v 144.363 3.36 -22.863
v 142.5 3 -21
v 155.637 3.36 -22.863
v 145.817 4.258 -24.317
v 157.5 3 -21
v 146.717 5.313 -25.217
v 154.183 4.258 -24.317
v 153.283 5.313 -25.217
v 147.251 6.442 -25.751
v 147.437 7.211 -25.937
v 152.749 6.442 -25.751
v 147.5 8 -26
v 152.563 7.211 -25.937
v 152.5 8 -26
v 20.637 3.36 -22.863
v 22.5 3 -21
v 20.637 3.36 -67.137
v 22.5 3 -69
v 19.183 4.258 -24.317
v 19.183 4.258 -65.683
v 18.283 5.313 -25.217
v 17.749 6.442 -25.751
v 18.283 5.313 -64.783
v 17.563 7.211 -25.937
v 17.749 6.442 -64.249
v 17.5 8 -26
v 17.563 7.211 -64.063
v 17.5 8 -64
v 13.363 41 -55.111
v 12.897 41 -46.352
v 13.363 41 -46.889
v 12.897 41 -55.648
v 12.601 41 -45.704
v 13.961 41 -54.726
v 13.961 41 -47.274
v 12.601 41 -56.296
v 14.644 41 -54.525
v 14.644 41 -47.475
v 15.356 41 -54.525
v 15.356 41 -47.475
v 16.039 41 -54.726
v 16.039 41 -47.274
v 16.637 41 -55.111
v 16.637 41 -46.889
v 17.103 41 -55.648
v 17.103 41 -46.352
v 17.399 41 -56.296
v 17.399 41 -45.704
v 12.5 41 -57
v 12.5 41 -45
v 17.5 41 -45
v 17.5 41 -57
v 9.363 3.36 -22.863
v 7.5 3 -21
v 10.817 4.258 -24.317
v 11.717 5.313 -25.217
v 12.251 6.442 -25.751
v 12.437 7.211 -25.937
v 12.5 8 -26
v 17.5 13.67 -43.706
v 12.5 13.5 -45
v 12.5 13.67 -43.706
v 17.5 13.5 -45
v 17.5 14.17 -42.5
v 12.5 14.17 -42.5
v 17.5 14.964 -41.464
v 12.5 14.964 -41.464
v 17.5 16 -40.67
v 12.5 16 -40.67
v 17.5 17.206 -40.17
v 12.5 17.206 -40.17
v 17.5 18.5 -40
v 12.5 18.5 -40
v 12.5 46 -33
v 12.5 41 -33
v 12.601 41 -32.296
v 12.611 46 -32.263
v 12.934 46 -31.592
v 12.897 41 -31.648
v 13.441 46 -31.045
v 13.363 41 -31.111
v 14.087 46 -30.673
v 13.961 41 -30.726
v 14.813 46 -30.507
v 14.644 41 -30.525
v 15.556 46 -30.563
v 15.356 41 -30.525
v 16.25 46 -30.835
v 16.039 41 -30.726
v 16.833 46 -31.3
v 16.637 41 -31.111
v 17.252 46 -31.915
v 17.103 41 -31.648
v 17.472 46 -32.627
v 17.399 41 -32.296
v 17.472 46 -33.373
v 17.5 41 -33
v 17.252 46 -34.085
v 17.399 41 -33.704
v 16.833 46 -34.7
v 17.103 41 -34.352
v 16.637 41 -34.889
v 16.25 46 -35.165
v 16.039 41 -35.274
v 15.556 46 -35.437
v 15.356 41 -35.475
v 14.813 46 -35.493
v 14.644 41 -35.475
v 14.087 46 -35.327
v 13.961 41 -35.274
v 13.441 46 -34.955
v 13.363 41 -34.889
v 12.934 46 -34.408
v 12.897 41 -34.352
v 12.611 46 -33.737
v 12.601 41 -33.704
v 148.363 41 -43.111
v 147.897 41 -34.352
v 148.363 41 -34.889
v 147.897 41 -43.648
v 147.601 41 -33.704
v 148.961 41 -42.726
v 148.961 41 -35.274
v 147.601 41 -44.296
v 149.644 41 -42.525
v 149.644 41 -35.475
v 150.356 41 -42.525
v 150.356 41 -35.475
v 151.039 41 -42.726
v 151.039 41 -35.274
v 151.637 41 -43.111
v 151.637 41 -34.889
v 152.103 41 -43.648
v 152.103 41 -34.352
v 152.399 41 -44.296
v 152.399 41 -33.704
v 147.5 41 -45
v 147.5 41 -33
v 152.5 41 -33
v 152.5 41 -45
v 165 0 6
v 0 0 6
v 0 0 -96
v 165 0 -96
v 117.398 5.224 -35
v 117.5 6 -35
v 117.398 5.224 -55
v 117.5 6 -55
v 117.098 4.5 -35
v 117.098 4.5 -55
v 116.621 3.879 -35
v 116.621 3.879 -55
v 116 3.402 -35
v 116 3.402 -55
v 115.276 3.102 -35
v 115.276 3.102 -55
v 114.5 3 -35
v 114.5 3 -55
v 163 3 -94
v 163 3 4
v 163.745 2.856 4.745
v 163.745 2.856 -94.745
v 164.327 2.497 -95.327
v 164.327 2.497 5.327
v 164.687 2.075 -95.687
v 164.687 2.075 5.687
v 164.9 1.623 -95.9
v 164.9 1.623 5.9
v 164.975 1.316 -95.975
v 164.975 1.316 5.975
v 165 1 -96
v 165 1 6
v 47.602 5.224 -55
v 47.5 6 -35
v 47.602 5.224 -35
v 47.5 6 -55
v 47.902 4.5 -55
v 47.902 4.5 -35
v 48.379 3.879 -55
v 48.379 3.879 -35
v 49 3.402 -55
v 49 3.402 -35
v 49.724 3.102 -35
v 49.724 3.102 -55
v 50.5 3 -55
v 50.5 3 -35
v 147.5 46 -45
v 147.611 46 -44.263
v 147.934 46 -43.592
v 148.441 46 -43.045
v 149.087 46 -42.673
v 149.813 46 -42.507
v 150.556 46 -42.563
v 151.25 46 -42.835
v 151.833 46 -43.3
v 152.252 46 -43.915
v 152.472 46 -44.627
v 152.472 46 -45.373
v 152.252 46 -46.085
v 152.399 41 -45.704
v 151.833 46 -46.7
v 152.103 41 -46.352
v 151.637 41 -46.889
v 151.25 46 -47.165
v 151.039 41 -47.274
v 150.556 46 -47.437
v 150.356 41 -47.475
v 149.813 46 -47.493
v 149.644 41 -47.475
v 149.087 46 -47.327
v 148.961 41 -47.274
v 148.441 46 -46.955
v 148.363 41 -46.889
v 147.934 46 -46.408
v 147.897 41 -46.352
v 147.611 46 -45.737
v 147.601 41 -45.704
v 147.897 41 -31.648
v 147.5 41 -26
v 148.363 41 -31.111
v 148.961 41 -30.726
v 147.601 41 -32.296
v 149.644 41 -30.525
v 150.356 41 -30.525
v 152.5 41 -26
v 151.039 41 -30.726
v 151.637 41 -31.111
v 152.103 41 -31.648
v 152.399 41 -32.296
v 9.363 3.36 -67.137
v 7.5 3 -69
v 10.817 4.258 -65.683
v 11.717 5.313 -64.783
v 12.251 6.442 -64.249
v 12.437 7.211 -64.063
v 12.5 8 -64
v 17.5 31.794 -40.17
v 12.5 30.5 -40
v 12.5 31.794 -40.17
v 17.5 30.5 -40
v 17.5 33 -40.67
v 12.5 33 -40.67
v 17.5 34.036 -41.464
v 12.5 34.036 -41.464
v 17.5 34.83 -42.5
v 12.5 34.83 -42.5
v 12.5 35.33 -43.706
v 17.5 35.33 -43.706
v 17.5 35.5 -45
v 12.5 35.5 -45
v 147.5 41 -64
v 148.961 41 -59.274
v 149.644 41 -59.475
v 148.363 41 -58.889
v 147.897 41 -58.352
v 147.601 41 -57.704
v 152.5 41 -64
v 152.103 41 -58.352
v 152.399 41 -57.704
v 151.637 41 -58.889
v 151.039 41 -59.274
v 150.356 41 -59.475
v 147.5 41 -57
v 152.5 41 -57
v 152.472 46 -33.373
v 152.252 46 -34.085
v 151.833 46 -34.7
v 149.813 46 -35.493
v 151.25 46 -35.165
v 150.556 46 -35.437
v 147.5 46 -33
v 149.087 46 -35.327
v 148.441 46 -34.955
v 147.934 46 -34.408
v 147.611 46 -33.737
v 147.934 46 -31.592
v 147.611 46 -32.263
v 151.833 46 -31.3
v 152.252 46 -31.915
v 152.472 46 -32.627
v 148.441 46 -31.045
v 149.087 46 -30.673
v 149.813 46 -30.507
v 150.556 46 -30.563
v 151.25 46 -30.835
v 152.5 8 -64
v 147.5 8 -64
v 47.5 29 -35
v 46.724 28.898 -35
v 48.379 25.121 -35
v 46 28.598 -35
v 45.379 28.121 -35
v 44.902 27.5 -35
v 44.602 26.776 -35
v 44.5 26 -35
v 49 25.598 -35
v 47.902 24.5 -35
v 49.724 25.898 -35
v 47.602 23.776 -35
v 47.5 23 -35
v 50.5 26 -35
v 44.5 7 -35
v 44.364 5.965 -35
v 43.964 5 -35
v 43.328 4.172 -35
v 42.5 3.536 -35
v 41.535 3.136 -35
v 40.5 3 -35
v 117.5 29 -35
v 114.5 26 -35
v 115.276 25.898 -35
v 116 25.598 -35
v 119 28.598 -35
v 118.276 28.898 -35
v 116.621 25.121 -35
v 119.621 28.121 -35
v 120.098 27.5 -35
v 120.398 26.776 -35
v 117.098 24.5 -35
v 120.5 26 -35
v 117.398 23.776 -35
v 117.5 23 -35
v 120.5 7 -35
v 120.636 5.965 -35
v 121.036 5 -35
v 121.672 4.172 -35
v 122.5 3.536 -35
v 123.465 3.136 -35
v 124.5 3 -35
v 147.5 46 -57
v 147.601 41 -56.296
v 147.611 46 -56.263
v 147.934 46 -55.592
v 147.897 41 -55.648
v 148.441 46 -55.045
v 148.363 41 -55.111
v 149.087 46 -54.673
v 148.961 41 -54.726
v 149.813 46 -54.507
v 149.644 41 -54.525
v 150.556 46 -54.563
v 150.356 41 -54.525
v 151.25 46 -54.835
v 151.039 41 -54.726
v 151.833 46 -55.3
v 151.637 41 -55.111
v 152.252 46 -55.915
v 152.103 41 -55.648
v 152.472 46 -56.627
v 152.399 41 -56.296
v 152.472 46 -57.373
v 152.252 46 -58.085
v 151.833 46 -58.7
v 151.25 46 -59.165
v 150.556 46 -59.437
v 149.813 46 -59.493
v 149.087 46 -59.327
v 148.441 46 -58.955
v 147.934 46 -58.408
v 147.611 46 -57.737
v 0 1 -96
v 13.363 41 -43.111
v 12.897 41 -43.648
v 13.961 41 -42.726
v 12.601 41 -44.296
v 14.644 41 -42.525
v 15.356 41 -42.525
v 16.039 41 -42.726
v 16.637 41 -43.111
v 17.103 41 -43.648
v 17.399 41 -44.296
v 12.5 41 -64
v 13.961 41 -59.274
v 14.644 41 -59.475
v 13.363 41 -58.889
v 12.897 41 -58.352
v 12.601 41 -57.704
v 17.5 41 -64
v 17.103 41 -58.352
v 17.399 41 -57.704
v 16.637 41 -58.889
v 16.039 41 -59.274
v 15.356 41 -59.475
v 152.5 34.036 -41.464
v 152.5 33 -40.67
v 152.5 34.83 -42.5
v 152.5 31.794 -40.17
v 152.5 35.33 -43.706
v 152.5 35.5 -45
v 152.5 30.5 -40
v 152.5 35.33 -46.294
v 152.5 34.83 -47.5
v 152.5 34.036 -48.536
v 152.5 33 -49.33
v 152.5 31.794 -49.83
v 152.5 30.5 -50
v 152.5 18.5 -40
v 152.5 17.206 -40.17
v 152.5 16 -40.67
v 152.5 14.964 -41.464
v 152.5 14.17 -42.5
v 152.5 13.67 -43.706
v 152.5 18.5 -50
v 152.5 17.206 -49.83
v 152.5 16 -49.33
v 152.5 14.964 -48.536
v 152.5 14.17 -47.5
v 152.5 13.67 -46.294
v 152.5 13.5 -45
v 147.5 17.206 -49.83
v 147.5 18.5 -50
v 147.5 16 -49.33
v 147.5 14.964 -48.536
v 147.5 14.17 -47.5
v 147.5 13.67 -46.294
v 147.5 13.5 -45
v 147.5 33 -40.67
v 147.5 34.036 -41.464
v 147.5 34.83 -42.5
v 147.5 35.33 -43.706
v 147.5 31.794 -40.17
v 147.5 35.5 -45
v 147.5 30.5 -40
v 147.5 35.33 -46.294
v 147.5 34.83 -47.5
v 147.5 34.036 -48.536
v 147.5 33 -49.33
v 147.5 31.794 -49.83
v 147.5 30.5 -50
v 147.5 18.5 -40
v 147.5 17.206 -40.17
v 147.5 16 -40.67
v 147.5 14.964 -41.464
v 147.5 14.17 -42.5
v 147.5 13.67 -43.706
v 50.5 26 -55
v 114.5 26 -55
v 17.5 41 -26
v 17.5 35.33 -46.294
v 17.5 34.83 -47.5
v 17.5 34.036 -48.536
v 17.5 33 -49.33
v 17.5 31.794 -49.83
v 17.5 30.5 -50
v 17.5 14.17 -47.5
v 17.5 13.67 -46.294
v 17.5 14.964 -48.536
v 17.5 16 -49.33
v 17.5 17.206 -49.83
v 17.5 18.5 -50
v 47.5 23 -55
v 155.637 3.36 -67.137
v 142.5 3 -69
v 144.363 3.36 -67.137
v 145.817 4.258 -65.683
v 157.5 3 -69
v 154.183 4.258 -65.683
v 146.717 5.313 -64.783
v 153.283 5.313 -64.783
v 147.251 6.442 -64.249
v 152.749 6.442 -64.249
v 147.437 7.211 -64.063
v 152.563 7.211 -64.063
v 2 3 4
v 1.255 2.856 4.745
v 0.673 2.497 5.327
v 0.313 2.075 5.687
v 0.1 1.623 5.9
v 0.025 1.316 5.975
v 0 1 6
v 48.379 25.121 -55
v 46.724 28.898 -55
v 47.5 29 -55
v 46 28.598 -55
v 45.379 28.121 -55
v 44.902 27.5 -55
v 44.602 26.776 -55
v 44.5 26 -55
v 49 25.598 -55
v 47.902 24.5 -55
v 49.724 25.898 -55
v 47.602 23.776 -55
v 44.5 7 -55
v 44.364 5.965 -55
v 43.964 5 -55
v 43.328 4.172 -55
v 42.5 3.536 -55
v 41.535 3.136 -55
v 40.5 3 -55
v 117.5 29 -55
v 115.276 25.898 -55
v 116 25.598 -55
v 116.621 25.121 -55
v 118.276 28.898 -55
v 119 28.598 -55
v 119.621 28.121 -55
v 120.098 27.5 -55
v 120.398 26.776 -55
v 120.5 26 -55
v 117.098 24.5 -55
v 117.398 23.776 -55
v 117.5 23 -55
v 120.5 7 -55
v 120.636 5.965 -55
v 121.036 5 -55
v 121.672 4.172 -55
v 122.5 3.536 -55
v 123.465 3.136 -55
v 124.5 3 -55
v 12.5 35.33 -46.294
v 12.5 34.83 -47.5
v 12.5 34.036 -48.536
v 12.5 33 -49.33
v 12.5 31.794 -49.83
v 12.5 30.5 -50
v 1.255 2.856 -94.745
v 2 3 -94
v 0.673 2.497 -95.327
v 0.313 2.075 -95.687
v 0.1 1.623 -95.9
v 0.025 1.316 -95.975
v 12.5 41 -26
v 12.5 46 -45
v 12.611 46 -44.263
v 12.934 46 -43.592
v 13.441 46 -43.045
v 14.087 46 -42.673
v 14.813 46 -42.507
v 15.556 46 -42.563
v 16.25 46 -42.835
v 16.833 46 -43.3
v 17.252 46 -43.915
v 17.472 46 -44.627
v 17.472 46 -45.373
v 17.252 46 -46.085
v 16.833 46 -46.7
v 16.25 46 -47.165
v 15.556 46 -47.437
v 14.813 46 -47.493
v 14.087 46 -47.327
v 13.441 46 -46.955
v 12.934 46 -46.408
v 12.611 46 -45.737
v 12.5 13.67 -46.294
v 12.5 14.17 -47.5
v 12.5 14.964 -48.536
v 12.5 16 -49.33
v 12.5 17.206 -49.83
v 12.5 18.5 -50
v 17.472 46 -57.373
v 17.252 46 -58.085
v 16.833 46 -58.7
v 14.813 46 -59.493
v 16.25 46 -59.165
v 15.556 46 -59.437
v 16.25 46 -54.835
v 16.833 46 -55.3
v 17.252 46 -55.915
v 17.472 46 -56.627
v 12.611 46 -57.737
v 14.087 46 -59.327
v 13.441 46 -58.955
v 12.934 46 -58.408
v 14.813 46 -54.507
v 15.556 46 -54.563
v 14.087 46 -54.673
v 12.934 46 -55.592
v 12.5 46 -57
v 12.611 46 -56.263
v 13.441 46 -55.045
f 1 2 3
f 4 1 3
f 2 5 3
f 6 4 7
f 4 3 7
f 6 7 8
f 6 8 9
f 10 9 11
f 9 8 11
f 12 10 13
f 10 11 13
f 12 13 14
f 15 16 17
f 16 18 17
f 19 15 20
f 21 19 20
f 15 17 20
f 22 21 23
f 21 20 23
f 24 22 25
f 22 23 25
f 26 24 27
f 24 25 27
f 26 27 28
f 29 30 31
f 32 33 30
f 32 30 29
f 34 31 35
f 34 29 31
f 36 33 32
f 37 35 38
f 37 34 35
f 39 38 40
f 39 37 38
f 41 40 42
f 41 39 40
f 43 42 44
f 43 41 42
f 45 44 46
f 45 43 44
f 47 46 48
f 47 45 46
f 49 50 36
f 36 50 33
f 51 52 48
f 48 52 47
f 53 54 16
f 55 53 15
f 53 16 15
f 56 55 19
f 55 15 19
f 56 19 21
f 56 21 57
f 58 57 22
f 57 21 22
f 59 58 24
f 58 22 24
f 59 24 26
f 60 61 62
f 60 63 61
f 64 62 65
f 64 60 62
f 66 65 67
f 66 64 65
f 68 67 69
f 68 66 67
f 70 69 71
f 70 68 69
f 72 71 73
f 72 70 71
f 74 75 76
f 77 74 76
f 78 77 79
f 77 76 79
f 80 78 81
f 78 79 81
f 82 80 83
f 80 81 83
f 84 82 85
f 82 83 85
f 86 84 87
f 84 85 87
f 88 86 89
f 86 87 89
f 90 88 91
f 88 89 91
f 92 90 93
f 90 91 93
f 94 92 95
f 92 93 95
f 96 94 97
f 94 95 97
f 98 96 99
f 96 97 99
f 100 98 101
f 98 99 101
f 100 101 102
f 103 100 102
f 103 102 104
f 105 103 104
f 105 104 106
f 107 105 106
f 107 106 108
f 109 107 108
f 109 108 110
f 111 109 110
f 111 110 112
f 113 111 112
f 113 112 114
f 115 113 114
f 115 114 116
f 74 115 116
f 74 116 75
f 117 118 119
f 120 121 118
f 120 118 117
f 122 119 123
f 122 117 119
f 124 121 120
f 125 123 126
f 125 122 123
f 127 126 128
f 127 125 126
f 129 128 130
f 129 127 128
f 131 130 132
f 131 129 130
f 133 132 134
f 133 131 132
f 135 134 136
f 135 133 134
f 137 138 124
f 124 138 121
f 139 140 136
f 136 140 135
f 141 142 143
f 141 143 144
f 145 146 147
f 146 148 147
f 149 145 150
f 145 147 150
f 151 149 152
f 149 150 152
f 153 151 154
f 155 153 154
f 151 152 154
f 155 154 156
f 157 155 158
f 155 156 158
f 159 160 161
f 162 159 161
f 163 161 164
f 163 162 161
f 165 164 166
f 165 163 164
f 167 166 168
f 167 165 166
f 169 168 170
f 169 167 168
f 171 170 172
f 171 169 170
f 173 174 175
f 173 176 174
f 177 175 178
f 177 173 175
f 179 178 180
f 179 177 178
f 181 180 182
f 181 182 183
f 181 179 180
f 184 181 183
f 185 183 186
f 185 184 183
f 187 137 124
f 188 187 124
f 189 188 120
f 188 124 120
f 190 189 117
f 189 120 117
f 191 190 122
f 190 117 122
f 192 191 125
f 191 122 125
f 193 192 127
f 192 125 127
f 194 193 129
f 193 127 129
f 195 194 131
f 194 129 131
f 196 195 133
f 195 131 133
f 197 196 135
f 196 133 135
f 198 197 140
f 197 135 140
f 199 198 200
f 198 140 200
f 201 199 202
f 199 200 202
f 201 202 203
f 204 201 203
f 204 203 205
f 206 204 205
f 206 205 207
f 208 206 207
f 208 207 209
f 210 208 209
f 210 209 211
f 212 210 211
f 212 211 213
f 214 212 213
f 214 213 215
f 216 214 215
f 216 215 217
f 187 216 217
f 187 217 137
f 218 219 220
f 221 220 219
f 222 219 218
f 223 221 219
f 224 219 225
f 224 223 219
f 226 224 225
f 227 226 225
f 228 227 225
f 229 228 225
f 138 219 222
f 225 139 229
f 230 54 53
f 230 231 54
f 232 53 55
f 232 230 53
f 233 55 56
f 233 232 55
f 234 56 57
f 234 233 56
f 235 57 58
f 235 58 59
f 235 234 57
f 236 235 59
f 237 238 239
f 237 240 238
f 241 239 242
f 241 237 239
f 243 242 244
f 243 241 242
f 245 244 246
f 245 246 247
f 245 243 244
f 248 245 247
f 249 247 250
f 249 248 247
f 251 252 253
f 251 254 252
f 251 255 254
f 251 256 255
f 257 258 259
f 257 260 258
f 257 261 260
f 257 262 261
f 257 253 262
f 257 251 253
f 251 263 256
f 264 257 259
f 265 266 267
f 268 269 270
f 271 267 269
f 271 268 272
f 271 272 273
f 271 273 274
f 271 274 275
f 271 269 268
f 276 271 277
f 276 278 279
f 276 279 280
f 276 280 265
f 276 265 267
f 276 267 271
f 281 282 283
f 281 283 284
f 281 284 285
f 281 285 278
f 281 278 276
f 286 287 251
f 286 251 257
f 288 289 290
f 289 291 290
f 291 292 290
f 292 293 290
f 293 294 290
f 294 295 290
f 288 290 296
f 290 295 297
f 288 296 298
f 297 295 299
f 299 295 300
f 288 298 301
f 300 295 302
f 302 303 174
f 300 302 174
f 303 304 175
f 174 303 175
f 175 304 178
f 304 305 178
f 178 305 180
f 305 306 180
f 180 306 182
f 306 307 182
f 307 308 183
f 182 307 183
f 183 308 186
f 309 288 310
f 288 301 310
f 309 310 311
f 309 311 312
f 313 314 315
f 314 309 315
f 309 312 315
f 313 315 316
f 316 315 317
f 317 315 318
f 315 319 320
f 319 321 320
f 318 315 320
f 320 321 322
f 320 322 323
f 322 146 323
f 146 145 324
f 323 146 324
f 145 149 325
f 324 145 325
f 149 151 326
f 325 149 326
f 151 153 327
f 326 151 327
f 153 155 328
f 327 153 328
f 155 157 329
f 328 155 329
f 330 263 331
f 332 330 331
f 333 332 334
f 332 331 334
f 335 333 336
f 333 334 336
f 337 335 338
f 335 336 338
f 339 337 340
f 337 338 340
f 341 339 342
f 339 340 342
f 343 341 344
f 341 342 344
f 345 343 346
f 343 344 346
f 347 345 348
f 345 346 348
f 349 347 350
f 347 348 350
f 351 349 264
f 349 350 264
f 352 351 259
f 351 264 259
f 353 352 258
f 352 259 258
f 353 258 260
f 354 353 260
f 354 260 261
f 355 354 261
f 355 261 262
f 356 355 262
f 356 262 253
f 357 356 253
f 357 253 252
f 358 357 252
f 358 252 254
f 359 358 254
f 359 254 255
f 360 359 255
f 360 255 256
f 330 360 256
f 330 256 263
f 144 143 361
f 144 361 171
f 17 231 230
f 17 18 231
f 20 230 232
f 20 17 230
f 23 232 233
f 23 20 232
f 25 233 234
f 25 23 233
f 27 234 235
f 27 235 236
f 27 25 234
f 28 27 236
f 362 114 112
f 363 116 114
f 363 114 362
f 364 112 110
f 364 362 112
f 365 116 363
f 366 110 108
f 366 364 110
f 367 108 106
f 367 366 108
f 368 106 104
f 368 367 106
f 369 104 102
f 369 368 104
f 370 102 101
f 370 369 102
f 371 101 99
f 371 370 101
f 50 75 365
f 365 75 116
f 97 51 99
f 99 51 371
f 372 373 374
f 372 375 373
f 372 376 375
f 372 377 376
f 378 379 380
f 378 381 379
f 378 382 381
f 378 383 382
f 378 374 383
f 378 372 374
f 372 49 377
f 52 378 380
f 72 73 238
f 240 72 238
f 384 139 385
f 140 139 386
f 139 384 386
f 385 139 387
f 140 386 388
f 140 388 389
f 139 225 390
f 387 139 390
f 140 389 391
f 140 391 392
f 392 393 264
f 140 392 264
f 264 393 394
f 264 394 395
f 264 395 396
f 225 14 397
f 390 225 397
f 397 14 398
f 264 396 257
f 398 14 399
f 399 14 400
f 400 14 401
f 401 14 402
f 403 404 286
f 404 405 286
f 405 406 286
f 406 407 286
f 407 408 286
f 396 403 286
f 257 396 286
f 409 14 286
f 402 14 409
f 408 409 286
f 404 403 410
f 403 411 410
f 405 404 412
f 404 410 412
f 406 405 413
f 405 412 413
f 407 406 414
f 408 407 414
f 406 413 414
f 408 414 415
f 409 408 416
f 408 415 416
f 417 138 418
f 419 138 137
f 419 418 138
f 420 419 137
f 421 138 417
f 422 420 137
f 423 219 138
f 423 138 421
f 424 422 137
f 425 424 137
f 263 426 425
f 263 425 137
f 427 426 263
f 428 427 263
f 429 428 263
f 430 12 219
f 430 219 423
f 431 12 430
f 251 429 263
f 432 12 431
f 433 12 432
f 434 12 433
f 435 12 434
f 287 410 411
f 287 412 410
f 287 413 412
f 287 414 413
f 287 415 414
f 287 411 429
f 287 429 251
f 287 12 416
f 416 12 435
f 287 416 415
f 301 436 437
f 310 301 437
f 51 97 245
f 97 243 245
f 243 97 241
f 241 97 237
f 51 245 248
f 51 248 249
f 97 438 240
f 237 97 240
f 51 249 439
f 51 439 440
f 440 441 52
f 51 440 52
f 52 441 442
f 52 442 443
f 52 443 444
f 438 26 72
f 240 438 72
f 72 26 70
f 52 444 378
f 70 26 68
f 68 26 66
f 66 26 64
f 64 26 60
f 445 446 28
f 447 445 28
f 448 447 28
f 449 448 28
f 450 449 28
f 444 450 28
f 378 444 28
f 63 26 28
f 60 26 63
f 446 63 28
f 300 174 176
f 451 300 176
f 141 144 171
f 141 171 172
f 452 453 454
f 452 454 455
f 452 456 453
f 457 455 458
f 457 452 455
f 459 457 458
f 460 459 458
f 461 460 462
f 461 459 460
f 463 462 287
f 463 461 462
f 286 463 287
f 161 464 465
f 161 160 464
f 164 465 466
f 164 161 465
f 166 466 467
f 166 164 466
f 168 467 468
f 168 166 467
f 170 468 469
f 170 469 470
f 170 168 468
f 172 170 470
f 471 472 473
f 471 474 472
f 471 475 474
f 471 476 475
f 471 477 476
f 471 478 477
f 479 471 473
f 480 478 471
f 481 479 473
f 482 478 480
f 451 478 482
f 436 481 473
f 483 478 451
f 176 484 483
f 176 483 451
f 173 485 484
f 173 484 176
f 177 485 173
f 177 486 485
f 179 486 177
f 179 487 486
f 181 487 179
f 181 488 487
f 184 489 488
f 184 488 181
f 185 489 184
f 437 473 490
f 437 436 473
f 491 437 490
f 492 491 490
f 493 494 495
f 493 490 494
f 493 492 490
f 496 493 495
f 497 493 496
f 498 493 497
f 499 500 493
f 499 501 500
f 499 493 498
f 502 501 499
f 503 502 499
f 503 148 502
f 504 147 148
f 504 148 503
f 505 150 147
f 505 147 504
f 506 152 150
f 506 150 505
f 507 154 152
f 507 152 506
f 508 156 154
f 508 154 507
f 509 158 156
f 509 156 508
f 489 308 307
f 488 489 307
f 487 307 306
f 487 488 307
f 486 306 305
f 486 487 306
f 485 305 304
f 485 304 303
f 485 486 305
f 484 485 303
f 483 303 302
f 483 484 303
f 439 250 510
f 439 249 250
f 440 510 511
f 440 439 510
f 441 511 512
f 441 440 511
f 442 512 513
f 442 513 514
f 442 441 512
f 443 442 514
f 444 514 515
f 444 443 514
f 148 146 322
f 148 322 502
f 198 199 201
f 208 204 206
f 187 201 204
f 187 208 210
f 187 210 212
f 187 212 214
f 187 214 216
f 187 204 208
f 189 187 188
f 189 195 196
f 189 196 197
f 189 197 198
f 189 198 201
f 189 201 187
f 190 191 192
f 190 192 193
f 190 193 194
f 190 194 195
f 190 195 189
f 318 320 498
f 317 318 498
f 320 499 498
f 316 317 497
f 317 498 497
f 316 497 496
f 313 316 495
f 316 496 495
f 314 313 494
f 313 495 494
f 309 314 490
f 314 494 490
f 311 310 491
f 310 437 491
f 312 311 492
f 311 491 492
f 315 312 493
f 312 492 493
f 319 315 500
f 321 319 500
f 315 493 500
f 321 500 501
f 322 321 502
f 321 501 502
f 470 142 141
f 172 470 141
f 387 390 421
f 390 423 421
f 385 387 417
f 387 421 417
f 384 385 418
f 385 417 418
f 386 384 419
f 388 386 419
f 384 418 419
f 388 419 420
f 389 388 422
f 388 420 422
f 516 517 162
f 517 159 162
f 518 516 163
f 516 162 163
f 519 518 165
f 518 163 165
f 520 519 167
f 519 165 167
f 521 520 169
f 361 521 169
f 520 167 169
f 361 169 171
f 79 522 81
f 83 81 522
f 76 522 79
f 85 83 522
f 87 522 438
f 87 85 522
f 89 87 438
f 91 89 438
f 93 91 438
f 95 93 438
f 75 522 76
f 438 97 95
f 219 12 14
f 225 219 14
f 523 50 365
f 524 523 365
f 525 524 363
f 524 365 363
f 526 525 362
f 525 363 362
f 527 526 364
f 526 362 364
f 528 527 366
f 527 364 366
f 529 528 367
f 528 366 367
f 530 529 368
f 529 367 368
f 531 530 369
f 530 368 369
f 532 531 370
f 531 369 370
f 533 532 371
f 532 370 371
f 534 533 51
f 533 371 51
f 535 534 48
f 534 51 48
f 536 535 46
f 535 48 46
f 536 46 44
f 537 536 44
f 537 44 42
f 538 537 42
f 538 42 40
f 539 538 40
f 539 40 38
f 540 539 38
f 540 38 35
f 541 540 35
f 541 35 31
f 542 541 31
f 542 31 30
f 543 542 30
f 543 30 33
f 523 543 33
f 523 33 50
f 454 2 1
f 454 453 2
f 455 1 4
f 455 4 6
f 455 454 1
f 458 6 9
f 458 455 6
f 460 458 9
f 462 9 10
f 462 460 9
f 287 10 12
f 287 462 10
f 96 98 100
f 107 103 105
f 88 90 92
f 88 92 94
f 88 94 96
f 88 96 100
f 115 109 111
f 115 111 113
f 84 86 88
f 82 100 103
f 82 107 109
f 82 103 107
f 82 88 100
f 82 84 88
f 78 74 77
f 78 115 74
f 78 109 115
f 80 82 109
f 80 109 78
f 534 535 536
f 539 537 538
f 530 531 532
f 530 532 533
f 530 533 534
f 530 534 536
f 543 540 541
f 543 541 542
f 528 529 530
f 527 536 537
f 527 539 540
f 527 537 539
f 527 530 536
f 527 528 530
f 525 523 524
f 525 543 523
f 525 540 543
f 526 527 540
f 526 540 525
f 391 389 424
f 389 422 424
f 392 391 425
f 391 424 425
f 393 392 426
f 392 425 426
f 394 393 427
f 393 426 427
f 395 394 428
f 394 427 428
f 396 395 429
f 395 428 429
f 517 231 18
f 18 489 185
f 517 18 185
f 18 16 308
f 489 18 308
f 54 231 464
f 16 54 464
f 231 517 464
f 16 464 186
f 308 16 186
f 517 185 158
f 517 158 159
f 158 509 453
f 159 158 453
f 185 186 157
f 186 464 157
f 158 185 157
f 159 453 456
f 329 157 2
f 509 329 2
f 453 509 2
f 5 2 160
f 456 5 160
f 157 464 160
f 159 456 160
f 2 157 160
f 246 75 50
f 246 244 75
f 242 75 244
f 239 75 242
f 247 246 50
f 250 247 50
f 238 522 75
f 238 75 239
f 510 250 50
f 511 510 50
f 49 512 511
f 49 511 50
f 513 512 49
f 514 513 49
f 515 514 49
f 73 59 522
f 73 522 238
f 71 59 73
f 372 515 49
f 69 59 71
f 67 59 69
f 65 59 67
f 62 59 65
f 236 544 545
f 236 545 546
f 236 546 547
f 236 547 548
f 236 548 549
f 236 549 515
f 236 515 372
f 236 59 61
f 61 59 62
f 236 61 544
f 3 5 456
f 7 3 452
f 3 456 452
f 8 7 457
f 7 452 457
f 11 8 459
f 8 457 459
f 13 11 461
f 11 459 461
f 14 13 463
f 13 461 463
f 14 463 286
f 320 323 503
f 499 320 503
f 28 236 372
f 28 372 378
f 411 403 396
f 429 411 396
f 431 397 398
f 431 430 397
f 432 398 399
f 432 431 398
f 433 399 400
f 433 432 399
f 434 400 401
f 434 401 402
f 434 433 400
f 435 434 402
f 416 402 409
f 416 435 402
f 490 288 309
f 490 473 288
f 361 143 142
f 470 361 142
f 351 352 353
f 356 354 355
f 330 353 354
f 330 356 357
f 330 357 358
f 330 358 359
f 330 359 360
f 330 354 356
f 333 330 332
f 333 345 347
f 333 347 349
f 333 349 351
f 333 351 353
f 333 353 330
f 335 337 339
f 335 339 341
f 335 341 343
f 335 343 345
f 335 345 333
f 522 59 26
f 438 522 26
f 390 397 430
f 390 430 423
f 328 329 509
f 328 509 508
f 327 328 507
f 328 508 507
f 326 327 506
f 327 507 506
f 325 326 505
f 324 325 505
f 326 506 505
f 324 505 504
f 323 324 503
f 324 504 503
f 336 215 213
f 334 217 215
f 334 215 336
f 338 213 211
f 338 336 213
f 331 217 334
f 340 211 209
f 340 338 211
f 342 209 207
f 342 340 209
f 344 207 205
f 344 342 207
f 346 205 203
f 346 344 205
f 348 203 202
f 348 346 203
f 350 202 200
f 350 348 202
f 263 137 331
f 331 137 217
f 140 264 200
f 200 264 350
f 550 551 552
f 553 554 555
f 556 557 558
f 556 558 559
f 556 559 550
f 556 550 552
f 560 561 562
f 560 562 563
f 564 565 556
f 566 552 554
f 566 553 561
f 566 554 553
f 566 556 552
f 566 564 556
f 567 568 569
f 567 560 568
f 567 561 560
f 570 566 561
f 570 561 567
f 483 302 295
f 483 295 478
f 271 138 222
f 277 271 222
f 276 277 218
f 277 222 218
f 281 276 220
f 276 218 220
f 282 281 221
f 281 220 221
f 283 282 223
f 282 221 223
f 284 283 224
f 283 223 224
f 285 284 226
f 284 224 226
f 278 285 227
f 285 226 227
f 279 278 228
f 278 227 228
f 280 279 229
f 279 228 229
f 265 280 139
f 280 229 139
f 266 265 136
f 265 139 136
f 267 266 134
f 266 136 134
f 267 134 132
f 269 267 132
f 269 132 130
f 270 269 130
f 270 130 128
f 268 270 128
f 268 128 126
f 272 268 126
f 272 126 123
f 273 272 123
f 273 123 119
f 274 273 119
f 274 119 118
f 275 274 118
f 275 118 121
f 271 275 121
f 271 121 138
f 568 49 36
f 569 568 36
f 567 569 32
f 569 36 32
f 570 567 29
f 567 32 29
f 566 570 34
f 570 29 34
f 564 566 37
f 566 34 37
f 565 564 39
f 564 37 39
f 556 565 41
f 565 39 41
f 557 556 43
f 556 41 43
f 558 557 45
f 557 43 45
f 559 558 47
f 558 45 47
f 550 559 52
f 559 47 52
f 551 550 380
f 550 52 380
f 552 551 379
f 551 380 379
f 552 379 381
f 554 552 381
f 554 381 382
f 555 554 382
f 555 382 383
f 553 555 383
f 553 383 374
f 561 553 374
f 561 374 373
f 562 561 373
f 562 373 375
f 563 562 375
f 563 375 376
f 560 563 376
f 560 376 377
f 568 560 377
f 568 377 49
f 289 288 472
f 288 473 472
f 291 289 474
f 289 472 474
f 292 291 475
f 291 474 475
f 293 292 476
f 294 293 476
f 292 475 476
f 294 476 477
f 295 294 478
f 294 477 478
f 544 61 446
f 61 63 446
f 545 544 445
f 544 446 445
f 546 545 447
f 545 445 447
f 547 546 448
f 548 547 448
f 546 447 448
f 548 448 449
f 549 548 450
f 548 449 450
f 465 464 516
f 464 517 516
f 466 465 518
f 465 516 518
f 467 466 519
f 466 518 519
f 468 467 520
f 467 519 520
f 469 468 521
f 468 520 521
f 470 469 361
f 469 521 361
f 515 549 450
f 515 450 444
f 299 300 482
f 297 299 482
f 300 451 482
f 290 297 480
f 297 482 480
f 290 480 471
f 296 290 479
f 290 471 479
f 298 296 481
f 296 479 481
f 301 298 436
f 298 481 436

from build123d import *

# Parameters (mm, degrees)
SKETCH1_W            = 165
SKETCH1_H            = 90
BOSS_EXTRUDE1_DEPTH  = 3
SKETCH2_W            = 5
SKETCH2_H            = 38
BOSS_EXTRUDE3_DEPTH  = 38
FILLET1_R            = 5
SKETCH3_R            = 2.5
BOSS_EXTRUDE4_DEPTH  = 5
SKETCH4_W            = 3
SKETCH4_H            = 20
BOSS_EXTRUDE5_DEPTH  = 23
SKETCH5_W            = 76
SKETCH5_H            = 20
BOSS_EXTRUDE6_DEPTH  = 3
FILLET3_R            = 3
FILLET4_R            = 3
SKETCH8_W            = 10
SKETCH8_H            = 22
CUT_EXTRUDE1_DEPTH   = 10
FILLET10_R           = 5
SKETCH9_W            = 10
SKETCH9_H            = 22
CUT_EXTRUDE2_DEPTH   = 10
FILLET11_R           = 5
SKETCH10_W           = 165
SKETCH10_H           = 6
BOSS_EXTRUDE9_DEPTH  = 3
FILLET13_R           = 4
SKETCH11_R           = 2.5
BOSS_EXTRUDE10_DEPTH = 5
FILLET14_R           = 2


with BuildPart() as part:
    # Sketch1 → Boss-Extrude1 (new body)
    with BuildSketch(Plane(origin=(0, 0, 0), x_dir=(1, 0, 0), z_dir=(0, 1, 0))):
        with Locations((82.5, 45)):
            Rectangle(SKETCH1_W, SKETCH1_H)
    extrude(amount=BOSS_EXTRUDE1_DEPTH)

    # Sketch2 → Boss-Extrude3 (add)
    with BuildSketch(Plane(origin=(0, 3, 0), x_dir=(1, 0, 0), z_dir=(0, 1, 0))):
        with Locations((15, 45)):
            Rectangle(SKETCH2_W, SKETCH2_H)
        with Locations((150, 45)):
            Rectangle(SKETCH2_W, SKETCH2_H)
    extrude(amount=BOSS_EXTRUDE3_DEPTH)

    # Fillet1
    fillet1_edges = [part.edges().sort_by_distance(p)[0] for p in [
        (12.5, 3, -45),
        (15, 3, -26),
        (17.5, 3, -45),
        (15, 3, -64),
        (150, 3, -64),
        (147.5, 3, -45),
        (150, 3, -26),
        (152.5, 3, -45),
    ]]
    fillet(fillet1_edges, radius=FILLET1_R)

    # Sketch3 → Boss-Extrude4 (add)
    with BuildSketch(Plane(origin=(0, 41, 0), x_dir=(1, 0, 0), z_dir=(0, 1, 0))):
        with Locations(Location((15, 57, 0), (0, 0, 180))):
            Circle(SKETCH3_R)
        with Locations(Location((15, 33, 0), (0, 0, 180))):
            Circle(SKETCH3_R)
        with Locations(Location((150, 57, 0), (0, 0, 180))):
            Circle(SKETCH3_R)
        with Locations(Location((150, 33, 0), (0, 0, 180))):
            Circle(SKETCH3_R)
    extrude(amount=BOSS_EXTRUDE4_DEPTH)

    # Sketch4 → Boss-Extrude5 (add)
    with BuildSketch(Plane(origin=(0, 3, 0), x_dir=(1, 0, 0), z_dir=(0, 1, 0))):
        with Locations((119, 45)):
            Rectangle(SKETCH4_W, SKETCH4_H)
        with Locations((46, 45)):
            Rectangle(SKETCH4_W, SKETCH4_H)
    extrude(amount=BOSS_EXTRUDE5_DEPTH)

    # Sketch5 → Boss-Extrude6 (add)
    with BuildSketch(Plane(origin=(0, 26, 0), x_dir=(1, 0, 0), z_dir=(0, 1, 0))):
        with Locations((82.5, 45)):
            Rectangle(SKETCH5_W, SKETCH5_H)
    extrude(amount=BOSS_EXTRUDE6_DEPTH)

    # Fillet3
    fillet3_edges = [part.edges().sort_by_distance(p)[0] for p in [
        (47.5, 3, -45),
        (47.5, 26, -45),
        (117.5, 3, -45),
        (117.5, 26, -45),
    ]]
    fillet(fillet3_edges, radius=FILLET3_R)

    # Fillet4
    fillet4_edges = [part.edges().sort_by_distance(p)[0] for p in [
        (120.5, 29, -45),
        (44.5, 29, -45),
    ]]
    fillet(fillet4_edges, radius=FILLET4_R)

    # Sketch8 → Cut-Extrude1 (cut)
    with BuildSketch(Plane.ZY.offset(-12.5)):
        with Locations((-45, 24.5)):
            Rectangle(SKETCH8_W, SKETCH8_H)
    extrude(amount=-CUT_EXTRUDE1_DEPTH, mode=Mode.SUBTRACT)

    # Fillet10
    fillet10_edges = [part.edges().sort_by_distance(p)[0] for p in [
        (15, 13.5, -50),
        (15, 35.5, -50),
        (15, 13.5, -40),
        (15, 35.5, -40),
    ]]
    fillet(fillet10_edges, radius=FILLET10_R - 0.0001)  # a hair under: the kernel refuses the full size

    # Sketch9 → Cut-Extrude2 (cut)
    with BuildSketch(Plane(origin=(152.5, 0, 0), x_dir=(0, 0, -1), z_dir=(1, 0, 0))):
        with Locations((45, 24.5)):
            Rectangle(SKETCH9_W, SKETCH9_H)
    extrude(amount=-CUT_EXTRUDE2_DEPTH, mode=Mode.SUBTRACT)

    # Fillet11
    fillet11_edges = [part.edges().sort_by_distance(p)[0] for p in [
        (150, 35.5, -40),
        (150, 13.5, -40),
        (150, 13.5, -50),
        (150, 35.5, -50),
    ]]
    fillet(fillet11_edges, radius=FILLET11_R - 0.0001)  # a hair under: the kernel refuses the full size

    # Sketch10 → Boss-Extrude9 (add)
    with BuildSketch(Plane.XZ):
        with Locations((82.5, -93)):
            Rectangle(SKETCH10_W, SKETCH10_H)
        with Locations((82.5, 3)):
            Rectangle(SKETCH10_W, SKETCH10_H)
    extrude(amount=-BOSS_EXTRUDE9_DEPTH)

    # Fillet13
    fillet13_edges = [part.edges().sort_by_distance(p)[0] for p in [
        (44.5, 3, -45),
        (120.5, 3, -45),
    ]]
    fillet(fillet13_edges, radius=FILLET13_R)

    # Sketch11 → Boss-Extrude10 (add)
    with BuildSketch(Plane(origin=(0, 41, 0), x_dir=(1, 0, 0), z_dir=(0, 1, 0))):
        with Locations(Location((150, 45, 0), (0, 0, 180))):
            Circle(SKETCH11_R)
        with Locations(Location((15, 45, 0), (0, 0, 180))):
            Circle(SKETCH11_R)
    extrude(amount=BOSS_EXTRUDE10_DEPTH)

    # Fillet14
    fillet14_edges = [part.edges().sort_by_distance(p)[0] for p in [
        (165, 3, -45),
        (82.5, 3, -96),
        (82.5, 3, 6),
        (0, 3, -45),
    ]]
    fillet(fillet14_edges, radius=FILLET14_R)


solid = part.part
